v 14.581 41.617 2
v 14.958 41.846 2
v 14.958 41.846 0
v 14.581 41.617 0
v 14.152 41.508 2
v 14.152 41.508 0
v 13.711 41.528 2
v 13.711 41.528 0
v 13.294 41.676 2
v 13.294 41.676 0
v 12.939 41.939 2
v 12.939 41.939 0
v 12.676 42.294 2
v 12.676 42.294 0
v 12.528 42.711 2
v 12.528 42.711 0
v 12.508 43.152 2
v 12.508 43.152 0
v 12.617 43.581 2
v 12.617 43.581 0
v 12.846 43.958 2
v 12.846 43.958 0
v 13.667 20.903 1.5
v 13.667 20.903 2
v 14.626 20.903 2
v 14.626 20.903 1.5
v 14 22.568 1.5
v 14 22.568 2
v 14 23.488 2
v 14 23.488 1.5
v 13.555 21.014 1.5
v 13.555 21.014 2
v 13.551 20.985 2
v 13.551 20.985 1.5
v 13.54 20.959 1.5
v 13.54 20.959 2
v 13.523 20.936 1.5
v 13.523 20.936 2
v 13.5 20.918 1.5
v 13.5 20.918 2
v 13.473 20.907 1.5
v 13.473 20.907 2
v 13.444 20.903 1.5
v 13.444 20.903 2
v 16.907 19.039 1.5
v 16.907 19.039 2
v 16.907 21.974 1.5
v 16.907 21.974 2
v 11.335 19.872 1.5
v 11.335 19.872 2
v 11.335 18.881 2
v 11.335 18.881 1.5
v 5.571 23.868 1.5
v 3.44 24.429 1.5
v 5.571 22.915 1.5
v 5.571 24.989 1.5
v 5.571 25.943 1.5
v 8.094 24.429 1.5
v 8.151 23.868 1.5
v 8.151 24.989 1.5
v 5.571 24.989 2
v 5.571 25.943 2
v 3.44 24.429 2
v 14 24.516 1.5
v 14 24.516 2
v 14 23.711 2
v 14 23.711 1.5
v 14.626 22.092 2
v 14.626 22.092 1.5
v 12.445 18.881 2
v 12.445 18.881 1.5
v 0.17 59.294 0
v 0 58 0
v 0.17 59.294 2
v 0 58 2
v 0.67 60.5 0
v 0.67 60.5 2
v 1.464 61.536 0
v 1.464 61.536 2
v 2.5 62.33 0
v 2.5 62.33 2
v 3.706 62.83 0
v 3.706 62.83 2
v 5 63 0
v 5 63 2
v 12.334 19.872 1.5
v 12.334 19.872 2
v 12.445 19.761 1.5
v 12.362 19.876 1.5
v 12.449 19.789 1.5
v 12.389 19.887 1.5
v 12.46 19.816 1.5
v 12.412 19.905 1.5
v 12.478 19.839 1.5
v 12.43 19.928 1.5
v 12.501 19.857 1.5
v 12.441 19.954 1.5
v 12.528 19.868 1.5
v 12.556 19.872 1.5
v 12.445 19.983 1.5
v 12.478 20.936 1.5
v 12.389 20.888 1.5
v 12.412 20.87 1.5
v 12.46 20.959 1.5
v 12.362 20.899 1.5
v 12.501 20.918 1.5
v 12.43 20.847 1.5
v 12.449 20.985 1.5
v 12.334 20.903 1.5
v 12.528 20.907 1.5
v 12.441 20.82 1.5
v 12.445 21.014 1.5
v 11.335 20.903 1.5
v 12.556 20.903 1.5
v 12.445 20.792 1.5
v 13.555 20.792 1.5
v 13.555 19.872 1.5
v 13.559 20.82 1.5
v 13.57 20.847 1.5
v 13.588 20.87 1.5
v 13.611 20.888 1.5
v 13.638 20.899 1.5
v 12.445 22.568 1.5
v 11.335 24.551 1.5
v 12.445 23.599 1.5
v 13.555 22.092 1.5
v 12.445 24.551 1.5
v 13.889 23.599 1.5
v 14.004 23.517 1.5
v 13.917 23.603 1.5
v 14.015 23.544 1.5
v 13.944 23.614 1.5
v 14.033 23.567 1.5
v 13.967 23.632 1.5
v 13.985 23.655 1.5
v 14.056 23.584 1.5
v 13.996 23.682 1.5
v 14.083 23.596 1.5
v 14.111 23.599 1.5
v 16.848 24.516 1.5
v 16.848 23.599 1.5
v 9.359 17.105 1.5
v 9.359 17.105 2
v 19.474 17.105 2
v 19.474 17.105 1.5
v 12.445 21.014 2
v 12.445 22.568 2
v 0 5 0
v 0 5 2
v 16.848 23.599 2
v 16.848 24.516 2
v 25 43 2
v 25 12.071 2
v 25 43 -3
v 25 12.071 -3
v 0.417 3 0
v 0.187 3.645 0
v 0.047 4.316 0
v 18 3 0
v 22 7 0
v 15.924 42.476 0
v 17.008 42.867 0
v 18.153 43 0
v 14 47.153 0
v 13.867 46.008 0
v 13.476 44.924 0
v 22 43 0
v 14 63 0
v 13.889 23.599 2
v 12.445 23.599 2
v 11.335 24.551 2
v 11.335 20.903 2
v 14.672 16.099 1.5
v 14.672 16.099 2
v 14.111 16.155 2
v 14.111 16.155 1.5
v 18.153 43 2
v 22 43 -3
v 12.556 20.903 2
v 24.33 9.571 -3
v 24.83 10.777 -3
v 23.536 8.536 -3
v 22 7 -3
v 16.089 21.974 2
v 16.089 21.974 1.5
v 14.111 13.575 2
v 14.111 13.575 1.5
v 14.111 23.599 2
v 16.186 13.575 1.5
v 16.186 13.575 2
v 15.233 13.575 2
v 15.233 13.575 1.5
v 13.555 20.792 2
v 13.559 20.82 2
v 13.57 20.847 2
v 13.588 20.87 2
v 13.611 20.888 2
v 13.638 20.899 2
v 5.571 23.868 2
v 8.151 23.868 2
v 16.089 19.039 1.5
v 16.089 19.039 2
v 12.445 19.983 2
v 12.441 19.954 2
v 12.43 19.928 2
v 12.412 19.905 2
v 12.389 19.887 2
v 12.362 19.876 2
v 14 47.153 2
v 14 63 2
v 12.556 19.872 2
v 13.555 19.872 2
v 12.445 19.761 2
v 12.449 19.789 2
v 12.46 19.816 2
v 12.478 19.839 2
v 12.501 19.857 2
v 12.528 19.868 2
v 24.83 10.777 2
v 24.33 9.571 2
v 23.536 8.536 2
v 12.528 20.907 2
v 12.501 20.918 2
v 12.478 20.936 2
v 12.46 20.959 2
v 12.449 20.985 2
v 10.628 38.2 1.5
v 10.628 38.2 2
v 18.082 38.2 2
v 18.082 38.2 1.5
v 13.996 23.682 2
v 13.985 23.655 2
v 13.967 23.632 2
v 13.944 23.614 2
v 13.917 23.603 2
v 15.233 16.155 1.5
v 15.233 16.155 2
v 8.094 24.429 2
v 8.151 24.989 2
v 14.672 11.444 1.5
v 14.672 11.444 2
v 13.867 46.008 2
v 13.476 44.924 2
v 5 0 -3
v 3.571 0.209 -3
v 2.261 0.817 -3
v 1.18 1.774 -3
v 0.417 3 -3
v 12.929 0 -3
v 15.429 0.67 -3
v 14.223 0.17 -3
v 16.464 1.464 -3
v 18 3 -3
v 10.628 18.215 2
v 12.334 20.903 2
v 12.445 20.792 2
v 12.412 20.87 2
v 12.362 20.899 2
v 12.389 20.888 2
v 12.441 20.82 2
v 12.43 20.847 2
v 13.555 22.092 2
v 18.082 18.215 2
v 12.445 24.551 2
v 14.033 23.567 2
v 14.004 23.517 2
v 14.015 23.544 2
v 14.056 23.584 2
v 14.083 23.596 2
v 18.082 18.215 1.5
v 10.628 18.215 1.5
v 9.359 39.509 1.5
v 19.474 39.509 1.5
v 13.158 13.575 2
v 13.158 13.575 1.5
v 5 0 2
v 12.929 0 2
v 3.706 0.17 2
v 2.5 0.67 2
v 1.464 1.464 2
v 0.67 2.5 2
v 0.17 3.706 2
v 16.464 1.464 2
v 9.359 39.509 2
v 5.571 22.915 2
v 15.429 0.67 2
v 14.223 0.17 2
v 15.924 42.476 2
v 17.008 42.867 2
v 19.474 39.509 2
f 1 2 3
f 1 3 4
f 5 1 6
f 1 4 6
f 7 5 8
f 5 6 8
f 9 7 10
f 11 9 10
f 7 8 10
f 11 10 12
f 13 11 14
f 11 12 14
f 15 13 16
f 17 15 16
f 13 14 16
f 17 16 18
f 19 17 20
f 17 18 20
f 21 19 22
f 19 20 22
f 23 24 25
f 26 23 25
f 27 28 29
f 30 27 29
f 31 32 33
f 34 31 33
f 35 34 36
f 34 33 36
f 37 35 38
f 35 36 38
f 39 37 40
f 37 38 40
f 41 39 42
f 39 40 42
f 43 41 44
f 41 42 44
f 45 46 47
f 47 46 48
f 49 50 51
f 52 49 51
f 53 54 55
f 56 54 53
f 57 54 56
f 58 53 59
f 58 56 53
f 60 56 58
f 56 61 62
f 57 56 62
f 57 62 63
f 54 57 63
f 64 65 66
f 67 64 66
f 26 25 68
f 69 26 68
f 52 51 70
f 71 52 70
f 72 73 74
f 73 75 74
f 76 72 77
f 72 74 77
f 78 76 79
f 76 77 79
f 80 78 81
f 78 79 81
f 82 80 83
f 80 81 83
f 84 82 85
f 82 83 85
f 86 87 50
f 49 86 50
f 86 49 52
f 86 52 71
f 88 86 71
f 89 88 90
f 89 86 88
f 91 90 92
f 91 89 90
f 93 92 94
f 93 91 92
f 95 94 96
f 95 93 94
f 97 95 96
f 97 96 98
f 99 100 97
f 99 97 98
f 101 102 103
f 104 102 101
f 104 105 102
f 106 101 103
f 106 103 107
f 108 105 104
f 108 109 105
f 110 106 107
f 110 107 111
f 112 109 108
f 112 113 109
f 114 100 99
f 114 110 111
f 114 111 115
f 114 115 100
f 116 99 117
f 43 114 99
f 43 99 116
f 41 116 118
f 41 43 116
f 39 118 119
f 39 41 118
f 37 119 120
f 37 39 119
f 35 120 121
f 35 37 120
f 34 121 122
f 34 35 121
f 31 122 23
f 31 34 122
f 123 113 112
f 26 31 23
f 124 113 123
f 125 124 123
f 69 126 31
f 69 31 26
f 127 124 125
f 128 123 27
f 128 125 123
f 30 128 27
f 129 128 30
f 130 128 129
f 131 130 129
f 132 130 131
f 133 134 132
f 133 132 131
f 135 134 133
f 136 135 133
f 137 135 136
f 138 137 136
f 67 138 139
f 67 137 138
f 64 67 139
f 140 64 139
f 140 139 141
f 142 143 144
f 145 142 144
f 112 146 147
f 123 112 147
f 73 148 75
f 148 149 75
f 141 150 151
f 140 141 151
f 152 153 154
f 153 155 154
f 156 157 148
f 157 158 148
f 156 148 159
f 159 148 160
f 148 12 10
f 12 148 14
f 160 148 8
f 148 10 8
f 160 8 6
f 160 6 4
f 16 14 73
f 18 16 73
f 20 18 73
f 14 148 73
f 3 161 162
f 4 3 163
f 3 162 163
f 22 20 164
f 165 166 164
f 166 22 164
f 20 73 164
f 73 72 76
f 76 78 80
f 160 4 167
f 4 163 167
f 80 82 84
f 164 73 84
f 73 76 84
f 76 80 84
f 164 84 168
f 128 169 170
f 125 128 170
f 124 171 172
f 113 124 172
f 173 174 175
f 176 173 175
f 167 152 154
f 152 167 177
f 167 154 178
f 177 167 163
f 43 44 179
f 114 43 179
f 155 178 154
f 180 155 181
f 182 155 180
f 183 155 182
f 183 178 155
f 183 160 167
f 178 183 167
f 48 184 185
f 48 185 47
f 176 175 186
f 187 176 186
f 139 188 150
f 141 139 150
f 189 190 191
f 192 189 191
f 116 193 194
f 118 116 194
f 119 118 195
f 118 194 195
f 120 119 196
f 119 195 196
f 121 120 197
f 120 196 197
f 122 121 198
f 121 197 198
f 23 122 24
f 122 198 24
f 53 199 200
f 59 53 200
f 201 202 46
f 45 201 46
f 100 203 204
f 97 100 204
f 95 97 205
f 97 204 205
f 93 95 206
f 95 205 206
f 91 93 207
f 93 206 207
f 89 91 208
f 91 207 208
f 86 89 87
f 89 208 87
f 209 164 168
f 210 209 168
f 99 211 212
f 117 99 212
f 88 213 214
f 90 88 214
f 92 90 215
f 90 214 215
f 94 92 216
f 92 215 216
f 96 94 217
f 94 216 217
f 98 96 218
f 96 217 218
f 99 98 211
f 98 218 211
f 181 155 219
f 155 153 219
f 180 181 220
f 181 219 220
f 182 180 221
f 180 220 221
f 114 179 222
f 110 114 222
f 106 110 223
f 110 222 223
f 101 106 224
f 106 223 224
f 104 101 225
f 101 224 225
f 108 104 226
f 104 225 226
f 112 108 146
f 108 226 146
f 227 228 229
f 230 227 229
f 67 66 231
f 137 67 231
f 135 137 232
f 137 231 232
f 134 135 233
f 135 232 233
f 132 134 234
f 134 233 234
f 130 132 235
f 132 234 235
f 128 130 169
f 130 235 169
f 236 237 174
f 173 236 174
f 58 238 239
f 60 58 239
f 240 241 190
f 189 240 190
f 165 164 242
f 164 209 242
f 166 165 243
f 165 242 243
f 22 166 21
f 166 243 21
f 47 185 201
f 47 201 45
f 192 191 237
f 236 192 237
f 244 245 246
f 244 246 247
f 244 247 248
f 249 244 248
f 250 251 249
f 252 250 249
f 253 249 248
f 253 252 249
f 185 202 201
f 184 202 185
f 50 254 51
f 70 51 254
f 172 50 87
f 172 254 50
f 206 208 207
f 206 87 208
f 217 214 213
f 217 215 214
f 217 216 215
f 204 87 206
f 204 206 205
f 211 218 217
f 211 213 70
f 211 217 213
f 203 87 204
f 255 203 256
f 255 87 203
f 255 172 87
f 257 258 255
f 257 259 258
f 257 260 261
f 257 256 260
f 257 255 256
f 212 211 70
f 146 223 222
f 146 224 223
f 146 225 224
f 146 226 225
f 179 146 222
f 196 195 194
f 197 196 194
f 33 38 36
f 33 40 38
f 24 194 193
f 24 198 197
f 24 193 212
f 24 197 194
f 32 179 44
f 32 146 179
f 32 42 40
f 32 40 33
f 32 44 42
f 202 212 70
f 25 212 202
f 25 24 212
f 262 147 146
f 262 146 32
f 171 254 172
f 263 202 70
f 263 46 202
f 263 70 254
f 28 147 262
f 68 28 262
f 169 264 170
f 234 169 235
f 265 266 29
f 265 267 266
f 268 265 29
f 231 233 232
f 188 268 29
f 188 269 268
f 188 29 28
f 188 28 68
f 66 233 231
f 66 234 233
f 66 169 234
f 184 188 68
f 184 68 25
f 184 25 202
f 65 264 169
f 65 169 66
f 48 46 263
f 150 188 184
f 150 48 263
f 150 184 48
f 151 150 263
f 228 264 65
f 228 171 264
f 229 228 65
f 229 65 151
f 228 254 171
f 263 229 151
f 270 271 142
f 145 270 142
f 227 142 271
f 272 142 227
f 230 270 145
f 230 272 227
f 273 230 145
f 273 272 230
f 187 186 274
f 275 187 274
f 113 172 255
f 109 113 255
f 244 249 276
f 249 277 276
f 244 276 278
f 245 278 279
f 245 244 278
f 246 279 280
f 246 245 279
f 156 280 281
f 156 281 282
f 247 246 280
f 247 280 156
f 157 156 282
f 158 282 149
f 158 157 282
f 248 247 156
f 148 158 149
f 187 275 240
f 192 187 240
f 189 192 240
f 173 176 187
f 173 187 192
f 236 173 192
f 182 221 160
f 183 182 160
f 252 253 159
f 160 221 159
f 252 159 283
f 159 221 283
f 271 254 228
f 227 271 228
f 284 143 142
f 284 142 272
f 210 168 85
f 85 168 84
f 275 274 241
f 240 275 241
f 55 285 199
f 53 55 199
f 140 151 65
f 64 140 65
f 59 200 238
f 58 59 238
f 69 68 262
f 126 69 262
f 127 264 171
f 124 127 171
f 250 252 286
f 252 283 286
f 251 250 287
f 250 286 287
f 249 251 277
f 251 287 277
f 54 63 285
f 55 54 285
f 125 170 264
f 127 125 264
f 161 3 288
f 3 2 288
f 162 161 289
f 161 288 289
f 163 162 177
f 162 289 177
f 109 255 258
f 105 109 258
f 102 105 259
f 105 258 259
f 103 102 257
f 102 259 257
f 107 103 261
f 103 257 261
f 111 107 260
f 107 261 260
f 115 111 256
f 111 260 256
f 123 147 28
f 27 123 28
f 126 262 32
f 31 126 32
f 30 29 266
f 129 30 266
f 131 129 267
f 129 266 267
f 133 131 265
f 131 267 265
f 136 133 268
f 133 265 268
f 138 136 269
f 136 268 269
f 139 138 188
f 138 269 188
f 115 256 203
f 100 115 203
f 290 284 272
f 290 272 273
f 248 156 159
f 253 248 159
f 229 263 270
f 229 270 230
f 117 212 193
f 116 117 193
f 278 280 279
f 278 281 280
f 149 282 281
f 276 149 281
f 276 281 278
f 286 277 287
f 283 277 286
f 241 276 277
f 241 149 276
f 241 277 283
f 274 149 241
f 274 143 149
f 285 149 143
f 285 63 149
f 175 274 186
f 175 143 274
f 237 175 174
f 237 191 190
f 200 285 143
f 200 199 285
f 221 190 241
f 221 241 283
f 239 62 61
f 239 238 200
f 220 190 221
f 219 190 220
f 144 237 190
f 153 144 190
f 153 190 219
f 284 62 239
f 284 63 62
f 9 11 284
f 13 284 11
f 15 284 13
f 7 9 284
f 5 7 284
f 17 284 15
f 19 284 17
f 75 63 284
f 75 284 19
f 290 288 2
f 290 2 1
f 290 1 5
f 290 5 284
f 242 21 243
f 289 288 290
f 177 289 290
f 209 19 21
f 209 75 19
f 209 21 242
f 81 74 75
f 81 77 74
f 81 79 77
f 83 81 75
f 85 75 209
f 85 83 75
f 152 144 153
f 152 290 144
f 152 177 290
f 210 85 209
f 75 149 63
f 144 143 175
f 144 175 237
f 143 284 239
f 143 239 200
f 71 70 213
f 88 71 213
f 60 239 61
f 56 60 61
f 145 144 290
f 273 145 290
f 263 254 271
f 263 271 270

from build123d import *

# Parameters (mm, degrees)
F1_DEPTH = 2
F3_DEPTH = 3
F4_R     = 5
F5_R     = 5
F6_W     = 10.114867
F6_H     = 22.403944
F6_W_2   = 7.454773
F6_H_2   = 19.985135
F6_W_3   = 0.818297
F6_H_3   = 2.934326
F7_DEPTH = 0.5


with BuildPart() as f1:
    # F0 (on Top) → F1 (new body)
    with BuildSketch(Plane.XY):
        with BuildLine():
            Line((0, 63), (0, 0))
            Line((0, 0), (15, 0))
            Line((15, 0), (25, 10))
            Line((25, 10), (25, 43))
            Line((25, 43), (15.5, 43))
            ThreePointArc((15.5, 43), (12.93934, 41.93934), (14, 44.5))
            Line((14, 44.5), (14, 63))
            Line((14, 63), (0, 63))
        make_face()
    extrude(amount=F1_DEPTH)

    # F2 (on face) → F3 (join)
    with BuildSketch(Plane(origin=(0, 0, 0), x_dir=(1, 0, 0), z_dir=(0, 0, -1))):
        Polygon((15, 0), (0, 0), (0, -3), (18, -3), align=None)
        Polygon((25, -43), (25, -10), (22, -7), (22, -43), align=None)
    extrude(amount=F3_DEPTH)

    # F4
    f4_edges = [f1.edges().sort_by_distance(p)[0] for p in [
        (14, 44.5, 1),
        (15.5, 43, 1),
    ]]
    fillet(f4_edges, radius=F4_R)

    # F5
    f5_edges = [f1.edges().sort_by_distance(p)[0] for p in [
        (0, 63, 1),
        (0, 0, -0.5),
        (15, 0, -0.5),
        (25, 10, -0.5),
    ]]
    fillet(f5_edges, radius=F5_R)

    # F6 (on face) → F7 (cut)
    with BuildSketch(Plane.XY.offset(2)):
        with Locations((14.416239, 28.307009)):
            Rectangle(F6_W, F6_H)
        with Locations((14.355088, 28.207892)):
            Rectangle(F6_W_2, F6_H_2, mode=Mode.SUBTRACT)
        Polygon((5.570976, 25.942754), (3.440016, 24.428651), (5.570976, 22.914547), (5.570976, 23.867872), (8.150558, 23.867872), (8.09448, 24.428651), (8.150558, 24.98943), (5.570976, 24.98943), align=None)
        Polygon((13.157818, 13.575147), (14.671921, 11.444188), (16.186024, 13.575147), (15.2327, 13.575147), (15.2327, 16.15473), (14.671921, 16.098652), (14.111142, 16.15473), (14.111142, 13.575147), align=None)
        with BuildLine():
            Line((11.334654, 19.87192), (11.334654, 18.880593))
            Line((11.334654, 18.880593), (12.444939, 18.880593))
            Line((12.444939, 18.880593), (12.444939, 19.760527))
            ThreePointArc((12.444939, 19.760527), (12.477566, 19.839294), (12.556333, 19.87192))
            Line((12.556333, 19.87192), (13.555225, 19.87192))
            Line((13.555225, 19.87192), (13.555225, 20.791506))
            ThreePointArc((13.555225, 20.791506), (13.587851, 20.870274), (13.666619, 20.9029))
            Line((13.666619, 20.9029), (14.625858, 20.9029))
            Line((14.625858, 20.9029), (14.625858, 22.092491))
            Line((14.625858, 22.092491), (13.555225, 22.092491))
            Line((13.555225, 22.092491), (13.555225, 21.014294))
            ThreePointArc((13.555225, 21.014294), (13.522599, 20.935526), (13.443831, 20.9029))
            Line((13.443831, 20.9029), (12.556333, 20.9029))
            ThreePointArc((12.556333, 20.9029), (12.477566, 20.935526), (12.444939, 21.014294))
            Line((12.444939, 21.014294), (12.444939, 22.568326))
            Line((12.444939, 22.568326), (14, 22.568326))
            Line((14, 22.568326), (14, 23.487912))
            ThreePointArc((14, 23.487912), (14.032626, 23.56668), (14.111394, 23.599306))
            Line((14.111394, 23.599306), (16.848227, 23.599306))
            Line((16.848227, 23.599306), (16.848227, 24.515837))
            Line((16.848227, 24.515837), (14, 24.515837))
            Line((14, 24.515837), (14, 23.7107))
            ThreePointArc((14, 23.7107), (13.967374, 23.631933), (13.888606, 23.599306))
            Line((13.888606, 23.599306), (12.444939, 23.599306))
            Line((12.444939, 23.599306), (12.444939, 24.55098))
            Line((12.444939, 24.55098), (11.334654, 24.55098))
            Line((11.334654, 24.55098), (11.334654, 22.050673))
            Line((11.334654, 22.050673), (11.334654, 20.9029))
            Line((11.334654, 20.9029), (12.333546, 20.9029))
            ThreePointArc((12.333546, 20.9029), (12.412313, 20.870274), (12.444939, 20.791506))
            Line((12.444939, 20.791506), (12.444939, 19.983314))
            ThreePointArc((12.444939, 19.983314), (12.412313, 19.904547), (12.333546, 19.87192))
            Line((12.333546, 19.87192), (11.334654, 19.87192))
        make_face()
        with Locations((16.497659, 20.506369)):
            Rectangle(F6_W_3, F6_H_3)
    extrude(amount=-F7_DEPTH, mode=Mode.SUBTRACT)


solid = f1.part
